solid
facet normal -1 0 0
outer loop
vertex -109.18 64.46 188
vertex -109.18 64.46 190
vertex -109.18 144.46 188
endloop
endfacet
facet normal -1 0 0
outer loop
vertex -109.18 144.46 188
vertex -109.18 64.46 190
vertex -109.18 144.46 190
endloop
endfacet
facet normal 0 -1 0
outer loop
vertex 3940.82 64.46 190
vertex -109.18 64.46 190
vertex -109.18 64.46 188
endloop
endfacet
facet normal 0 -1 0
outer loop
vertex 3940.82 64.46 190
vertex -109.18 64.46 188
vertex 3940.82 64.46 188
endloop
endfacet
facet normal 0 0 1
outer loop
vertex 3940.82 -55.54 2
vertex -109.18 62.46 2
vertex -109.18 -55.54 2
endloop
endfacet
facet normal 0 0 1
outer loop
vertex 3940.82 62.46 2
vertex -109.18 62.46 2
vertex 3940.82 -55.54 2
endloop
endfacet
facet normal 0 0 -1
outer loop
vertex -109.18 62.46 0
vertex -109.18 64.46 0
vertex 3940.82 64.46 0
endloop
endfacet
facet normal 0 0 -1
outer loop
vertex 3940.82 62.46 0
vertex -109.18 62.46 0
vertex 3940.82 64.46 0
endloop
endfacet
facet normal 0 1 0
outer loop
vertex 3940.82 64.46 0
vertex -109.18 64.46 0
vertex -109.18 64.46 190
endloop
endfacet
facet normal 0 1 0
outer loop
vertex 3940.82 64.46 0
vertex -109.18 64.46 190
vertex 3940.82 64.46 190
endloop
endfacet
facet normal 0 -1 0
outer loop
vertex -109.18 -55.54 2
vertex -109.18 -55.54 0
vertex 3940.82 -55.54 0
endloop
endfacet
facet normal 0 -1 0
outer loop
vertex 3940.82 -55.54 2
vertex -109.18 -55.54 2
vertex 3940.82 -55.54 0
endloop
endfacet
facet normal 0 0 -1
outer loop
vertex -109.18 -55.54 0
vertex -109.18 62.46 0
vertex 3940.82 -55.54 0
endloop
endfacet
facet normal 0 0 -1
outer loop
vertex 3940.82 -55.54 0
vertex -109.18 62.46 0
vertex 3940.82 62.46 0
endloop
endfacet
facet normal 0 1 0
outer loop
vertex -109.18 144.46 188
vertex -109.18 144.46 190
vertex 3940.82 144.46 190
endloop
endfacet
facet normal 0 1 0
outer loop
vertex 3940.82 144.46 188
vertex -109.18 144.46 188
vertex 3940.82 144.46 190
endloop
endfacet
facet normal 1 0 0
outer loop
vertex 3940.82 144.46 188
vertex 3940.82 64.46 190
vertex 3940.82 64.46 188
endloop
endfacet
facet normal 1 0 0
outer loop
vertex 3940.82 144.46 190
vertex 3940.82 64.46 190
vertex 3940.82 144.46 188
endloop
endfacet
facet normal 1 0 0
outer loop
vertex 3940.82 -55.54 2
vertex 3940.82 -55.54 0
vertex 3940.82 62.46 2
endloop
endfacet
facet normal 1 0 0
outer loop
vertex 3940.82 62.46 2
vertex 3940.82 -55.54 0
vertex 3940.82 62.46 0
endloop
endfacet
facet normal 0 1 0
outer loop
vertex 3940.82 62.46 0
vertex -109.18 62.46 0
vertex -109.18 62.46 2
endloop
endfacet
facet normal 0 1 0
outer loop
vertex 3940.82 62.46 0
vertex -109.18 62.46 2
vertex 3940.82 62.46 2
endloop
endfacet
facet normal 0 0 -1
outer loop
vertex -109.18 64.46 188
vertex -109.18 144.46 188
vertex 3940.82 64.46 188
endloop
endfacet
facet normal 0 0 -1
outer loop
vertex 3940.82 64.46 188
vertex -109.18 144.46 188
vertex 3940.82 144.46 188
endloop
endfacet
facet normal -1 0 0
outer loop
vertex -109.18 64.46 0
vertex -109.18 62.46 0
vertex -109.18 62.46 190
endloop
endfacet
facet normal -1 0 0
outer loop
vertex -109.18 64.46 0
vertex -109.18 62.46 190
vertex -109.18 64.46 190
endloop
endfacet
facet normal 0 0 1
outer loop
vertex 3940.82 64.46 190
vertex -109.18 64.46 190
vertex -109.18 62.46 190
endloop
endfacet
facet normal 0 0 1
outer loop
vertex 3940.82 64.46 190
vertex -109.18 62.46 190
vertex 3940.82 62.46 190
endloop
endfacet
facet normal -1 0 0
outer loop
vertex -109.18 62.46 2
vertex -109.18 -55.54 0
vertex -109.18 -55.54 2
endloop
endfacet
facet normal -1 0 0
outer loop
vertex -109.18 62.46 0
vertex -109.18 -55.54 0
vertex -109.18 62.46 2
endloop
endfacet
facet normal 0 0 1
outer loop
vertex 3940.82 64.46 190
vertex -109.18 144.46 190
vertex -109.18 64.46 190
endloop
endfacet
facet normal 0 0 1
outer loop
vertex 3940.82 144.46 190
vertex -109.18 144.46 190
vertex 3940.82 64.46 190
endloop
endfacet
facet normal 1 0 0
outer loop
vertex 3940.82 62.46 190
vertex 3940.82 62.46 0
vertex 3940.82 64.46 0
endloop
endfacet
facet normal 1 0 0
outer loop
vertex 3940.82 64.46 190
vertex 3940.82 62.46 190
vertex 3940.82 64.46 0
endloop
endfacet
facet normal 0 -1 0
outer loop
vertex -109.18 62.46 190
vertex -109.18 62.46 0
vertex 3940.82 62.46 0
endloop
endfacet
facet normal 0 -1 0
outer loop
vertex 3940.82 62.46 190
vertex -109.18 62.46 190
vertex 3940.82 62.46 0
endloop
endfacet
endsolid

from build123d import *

# Parameters (mm, degrees)
F0_W     = 4050
F0_H     = 118
F1_DEPTH = 2
F0_H_2   = 2
F2_DEPTH = 190
F3_W     = 4050
F3_H     = 80
F4_DEPTH = 2


with BuildPart() as f1:
    # F0 (on Top) → F1 (new body)
    with BuildSketch(Plane.XY):
        with Locations((1915.820207, 3.459525)):
            Rectangle(F0_W, F0_H)
    extrude(amount=F1_DEPTH)


with BuildPart() as f2:
    # F0 (on Top) → F2 (new body)
    with BuildSketch(Plane.XY):
        with Locations((1915.820207, 63.459525)):
            Rectangle(F0_W, F0_H_2)
    extrude(amount=F2_DEPTH)


with BuildPart() as f4:
    # F3 (on face) → F4 (new body)
    with BuildSketch(Plane.XY.offset(190)):
        with Locations((1915.820207, 104.459525)):
            Rectangle(F3_W, F3_H)
    extrude(amount=-F4_DEPTH)


solid = Compound([f1.part, f2.part, f4.part])
